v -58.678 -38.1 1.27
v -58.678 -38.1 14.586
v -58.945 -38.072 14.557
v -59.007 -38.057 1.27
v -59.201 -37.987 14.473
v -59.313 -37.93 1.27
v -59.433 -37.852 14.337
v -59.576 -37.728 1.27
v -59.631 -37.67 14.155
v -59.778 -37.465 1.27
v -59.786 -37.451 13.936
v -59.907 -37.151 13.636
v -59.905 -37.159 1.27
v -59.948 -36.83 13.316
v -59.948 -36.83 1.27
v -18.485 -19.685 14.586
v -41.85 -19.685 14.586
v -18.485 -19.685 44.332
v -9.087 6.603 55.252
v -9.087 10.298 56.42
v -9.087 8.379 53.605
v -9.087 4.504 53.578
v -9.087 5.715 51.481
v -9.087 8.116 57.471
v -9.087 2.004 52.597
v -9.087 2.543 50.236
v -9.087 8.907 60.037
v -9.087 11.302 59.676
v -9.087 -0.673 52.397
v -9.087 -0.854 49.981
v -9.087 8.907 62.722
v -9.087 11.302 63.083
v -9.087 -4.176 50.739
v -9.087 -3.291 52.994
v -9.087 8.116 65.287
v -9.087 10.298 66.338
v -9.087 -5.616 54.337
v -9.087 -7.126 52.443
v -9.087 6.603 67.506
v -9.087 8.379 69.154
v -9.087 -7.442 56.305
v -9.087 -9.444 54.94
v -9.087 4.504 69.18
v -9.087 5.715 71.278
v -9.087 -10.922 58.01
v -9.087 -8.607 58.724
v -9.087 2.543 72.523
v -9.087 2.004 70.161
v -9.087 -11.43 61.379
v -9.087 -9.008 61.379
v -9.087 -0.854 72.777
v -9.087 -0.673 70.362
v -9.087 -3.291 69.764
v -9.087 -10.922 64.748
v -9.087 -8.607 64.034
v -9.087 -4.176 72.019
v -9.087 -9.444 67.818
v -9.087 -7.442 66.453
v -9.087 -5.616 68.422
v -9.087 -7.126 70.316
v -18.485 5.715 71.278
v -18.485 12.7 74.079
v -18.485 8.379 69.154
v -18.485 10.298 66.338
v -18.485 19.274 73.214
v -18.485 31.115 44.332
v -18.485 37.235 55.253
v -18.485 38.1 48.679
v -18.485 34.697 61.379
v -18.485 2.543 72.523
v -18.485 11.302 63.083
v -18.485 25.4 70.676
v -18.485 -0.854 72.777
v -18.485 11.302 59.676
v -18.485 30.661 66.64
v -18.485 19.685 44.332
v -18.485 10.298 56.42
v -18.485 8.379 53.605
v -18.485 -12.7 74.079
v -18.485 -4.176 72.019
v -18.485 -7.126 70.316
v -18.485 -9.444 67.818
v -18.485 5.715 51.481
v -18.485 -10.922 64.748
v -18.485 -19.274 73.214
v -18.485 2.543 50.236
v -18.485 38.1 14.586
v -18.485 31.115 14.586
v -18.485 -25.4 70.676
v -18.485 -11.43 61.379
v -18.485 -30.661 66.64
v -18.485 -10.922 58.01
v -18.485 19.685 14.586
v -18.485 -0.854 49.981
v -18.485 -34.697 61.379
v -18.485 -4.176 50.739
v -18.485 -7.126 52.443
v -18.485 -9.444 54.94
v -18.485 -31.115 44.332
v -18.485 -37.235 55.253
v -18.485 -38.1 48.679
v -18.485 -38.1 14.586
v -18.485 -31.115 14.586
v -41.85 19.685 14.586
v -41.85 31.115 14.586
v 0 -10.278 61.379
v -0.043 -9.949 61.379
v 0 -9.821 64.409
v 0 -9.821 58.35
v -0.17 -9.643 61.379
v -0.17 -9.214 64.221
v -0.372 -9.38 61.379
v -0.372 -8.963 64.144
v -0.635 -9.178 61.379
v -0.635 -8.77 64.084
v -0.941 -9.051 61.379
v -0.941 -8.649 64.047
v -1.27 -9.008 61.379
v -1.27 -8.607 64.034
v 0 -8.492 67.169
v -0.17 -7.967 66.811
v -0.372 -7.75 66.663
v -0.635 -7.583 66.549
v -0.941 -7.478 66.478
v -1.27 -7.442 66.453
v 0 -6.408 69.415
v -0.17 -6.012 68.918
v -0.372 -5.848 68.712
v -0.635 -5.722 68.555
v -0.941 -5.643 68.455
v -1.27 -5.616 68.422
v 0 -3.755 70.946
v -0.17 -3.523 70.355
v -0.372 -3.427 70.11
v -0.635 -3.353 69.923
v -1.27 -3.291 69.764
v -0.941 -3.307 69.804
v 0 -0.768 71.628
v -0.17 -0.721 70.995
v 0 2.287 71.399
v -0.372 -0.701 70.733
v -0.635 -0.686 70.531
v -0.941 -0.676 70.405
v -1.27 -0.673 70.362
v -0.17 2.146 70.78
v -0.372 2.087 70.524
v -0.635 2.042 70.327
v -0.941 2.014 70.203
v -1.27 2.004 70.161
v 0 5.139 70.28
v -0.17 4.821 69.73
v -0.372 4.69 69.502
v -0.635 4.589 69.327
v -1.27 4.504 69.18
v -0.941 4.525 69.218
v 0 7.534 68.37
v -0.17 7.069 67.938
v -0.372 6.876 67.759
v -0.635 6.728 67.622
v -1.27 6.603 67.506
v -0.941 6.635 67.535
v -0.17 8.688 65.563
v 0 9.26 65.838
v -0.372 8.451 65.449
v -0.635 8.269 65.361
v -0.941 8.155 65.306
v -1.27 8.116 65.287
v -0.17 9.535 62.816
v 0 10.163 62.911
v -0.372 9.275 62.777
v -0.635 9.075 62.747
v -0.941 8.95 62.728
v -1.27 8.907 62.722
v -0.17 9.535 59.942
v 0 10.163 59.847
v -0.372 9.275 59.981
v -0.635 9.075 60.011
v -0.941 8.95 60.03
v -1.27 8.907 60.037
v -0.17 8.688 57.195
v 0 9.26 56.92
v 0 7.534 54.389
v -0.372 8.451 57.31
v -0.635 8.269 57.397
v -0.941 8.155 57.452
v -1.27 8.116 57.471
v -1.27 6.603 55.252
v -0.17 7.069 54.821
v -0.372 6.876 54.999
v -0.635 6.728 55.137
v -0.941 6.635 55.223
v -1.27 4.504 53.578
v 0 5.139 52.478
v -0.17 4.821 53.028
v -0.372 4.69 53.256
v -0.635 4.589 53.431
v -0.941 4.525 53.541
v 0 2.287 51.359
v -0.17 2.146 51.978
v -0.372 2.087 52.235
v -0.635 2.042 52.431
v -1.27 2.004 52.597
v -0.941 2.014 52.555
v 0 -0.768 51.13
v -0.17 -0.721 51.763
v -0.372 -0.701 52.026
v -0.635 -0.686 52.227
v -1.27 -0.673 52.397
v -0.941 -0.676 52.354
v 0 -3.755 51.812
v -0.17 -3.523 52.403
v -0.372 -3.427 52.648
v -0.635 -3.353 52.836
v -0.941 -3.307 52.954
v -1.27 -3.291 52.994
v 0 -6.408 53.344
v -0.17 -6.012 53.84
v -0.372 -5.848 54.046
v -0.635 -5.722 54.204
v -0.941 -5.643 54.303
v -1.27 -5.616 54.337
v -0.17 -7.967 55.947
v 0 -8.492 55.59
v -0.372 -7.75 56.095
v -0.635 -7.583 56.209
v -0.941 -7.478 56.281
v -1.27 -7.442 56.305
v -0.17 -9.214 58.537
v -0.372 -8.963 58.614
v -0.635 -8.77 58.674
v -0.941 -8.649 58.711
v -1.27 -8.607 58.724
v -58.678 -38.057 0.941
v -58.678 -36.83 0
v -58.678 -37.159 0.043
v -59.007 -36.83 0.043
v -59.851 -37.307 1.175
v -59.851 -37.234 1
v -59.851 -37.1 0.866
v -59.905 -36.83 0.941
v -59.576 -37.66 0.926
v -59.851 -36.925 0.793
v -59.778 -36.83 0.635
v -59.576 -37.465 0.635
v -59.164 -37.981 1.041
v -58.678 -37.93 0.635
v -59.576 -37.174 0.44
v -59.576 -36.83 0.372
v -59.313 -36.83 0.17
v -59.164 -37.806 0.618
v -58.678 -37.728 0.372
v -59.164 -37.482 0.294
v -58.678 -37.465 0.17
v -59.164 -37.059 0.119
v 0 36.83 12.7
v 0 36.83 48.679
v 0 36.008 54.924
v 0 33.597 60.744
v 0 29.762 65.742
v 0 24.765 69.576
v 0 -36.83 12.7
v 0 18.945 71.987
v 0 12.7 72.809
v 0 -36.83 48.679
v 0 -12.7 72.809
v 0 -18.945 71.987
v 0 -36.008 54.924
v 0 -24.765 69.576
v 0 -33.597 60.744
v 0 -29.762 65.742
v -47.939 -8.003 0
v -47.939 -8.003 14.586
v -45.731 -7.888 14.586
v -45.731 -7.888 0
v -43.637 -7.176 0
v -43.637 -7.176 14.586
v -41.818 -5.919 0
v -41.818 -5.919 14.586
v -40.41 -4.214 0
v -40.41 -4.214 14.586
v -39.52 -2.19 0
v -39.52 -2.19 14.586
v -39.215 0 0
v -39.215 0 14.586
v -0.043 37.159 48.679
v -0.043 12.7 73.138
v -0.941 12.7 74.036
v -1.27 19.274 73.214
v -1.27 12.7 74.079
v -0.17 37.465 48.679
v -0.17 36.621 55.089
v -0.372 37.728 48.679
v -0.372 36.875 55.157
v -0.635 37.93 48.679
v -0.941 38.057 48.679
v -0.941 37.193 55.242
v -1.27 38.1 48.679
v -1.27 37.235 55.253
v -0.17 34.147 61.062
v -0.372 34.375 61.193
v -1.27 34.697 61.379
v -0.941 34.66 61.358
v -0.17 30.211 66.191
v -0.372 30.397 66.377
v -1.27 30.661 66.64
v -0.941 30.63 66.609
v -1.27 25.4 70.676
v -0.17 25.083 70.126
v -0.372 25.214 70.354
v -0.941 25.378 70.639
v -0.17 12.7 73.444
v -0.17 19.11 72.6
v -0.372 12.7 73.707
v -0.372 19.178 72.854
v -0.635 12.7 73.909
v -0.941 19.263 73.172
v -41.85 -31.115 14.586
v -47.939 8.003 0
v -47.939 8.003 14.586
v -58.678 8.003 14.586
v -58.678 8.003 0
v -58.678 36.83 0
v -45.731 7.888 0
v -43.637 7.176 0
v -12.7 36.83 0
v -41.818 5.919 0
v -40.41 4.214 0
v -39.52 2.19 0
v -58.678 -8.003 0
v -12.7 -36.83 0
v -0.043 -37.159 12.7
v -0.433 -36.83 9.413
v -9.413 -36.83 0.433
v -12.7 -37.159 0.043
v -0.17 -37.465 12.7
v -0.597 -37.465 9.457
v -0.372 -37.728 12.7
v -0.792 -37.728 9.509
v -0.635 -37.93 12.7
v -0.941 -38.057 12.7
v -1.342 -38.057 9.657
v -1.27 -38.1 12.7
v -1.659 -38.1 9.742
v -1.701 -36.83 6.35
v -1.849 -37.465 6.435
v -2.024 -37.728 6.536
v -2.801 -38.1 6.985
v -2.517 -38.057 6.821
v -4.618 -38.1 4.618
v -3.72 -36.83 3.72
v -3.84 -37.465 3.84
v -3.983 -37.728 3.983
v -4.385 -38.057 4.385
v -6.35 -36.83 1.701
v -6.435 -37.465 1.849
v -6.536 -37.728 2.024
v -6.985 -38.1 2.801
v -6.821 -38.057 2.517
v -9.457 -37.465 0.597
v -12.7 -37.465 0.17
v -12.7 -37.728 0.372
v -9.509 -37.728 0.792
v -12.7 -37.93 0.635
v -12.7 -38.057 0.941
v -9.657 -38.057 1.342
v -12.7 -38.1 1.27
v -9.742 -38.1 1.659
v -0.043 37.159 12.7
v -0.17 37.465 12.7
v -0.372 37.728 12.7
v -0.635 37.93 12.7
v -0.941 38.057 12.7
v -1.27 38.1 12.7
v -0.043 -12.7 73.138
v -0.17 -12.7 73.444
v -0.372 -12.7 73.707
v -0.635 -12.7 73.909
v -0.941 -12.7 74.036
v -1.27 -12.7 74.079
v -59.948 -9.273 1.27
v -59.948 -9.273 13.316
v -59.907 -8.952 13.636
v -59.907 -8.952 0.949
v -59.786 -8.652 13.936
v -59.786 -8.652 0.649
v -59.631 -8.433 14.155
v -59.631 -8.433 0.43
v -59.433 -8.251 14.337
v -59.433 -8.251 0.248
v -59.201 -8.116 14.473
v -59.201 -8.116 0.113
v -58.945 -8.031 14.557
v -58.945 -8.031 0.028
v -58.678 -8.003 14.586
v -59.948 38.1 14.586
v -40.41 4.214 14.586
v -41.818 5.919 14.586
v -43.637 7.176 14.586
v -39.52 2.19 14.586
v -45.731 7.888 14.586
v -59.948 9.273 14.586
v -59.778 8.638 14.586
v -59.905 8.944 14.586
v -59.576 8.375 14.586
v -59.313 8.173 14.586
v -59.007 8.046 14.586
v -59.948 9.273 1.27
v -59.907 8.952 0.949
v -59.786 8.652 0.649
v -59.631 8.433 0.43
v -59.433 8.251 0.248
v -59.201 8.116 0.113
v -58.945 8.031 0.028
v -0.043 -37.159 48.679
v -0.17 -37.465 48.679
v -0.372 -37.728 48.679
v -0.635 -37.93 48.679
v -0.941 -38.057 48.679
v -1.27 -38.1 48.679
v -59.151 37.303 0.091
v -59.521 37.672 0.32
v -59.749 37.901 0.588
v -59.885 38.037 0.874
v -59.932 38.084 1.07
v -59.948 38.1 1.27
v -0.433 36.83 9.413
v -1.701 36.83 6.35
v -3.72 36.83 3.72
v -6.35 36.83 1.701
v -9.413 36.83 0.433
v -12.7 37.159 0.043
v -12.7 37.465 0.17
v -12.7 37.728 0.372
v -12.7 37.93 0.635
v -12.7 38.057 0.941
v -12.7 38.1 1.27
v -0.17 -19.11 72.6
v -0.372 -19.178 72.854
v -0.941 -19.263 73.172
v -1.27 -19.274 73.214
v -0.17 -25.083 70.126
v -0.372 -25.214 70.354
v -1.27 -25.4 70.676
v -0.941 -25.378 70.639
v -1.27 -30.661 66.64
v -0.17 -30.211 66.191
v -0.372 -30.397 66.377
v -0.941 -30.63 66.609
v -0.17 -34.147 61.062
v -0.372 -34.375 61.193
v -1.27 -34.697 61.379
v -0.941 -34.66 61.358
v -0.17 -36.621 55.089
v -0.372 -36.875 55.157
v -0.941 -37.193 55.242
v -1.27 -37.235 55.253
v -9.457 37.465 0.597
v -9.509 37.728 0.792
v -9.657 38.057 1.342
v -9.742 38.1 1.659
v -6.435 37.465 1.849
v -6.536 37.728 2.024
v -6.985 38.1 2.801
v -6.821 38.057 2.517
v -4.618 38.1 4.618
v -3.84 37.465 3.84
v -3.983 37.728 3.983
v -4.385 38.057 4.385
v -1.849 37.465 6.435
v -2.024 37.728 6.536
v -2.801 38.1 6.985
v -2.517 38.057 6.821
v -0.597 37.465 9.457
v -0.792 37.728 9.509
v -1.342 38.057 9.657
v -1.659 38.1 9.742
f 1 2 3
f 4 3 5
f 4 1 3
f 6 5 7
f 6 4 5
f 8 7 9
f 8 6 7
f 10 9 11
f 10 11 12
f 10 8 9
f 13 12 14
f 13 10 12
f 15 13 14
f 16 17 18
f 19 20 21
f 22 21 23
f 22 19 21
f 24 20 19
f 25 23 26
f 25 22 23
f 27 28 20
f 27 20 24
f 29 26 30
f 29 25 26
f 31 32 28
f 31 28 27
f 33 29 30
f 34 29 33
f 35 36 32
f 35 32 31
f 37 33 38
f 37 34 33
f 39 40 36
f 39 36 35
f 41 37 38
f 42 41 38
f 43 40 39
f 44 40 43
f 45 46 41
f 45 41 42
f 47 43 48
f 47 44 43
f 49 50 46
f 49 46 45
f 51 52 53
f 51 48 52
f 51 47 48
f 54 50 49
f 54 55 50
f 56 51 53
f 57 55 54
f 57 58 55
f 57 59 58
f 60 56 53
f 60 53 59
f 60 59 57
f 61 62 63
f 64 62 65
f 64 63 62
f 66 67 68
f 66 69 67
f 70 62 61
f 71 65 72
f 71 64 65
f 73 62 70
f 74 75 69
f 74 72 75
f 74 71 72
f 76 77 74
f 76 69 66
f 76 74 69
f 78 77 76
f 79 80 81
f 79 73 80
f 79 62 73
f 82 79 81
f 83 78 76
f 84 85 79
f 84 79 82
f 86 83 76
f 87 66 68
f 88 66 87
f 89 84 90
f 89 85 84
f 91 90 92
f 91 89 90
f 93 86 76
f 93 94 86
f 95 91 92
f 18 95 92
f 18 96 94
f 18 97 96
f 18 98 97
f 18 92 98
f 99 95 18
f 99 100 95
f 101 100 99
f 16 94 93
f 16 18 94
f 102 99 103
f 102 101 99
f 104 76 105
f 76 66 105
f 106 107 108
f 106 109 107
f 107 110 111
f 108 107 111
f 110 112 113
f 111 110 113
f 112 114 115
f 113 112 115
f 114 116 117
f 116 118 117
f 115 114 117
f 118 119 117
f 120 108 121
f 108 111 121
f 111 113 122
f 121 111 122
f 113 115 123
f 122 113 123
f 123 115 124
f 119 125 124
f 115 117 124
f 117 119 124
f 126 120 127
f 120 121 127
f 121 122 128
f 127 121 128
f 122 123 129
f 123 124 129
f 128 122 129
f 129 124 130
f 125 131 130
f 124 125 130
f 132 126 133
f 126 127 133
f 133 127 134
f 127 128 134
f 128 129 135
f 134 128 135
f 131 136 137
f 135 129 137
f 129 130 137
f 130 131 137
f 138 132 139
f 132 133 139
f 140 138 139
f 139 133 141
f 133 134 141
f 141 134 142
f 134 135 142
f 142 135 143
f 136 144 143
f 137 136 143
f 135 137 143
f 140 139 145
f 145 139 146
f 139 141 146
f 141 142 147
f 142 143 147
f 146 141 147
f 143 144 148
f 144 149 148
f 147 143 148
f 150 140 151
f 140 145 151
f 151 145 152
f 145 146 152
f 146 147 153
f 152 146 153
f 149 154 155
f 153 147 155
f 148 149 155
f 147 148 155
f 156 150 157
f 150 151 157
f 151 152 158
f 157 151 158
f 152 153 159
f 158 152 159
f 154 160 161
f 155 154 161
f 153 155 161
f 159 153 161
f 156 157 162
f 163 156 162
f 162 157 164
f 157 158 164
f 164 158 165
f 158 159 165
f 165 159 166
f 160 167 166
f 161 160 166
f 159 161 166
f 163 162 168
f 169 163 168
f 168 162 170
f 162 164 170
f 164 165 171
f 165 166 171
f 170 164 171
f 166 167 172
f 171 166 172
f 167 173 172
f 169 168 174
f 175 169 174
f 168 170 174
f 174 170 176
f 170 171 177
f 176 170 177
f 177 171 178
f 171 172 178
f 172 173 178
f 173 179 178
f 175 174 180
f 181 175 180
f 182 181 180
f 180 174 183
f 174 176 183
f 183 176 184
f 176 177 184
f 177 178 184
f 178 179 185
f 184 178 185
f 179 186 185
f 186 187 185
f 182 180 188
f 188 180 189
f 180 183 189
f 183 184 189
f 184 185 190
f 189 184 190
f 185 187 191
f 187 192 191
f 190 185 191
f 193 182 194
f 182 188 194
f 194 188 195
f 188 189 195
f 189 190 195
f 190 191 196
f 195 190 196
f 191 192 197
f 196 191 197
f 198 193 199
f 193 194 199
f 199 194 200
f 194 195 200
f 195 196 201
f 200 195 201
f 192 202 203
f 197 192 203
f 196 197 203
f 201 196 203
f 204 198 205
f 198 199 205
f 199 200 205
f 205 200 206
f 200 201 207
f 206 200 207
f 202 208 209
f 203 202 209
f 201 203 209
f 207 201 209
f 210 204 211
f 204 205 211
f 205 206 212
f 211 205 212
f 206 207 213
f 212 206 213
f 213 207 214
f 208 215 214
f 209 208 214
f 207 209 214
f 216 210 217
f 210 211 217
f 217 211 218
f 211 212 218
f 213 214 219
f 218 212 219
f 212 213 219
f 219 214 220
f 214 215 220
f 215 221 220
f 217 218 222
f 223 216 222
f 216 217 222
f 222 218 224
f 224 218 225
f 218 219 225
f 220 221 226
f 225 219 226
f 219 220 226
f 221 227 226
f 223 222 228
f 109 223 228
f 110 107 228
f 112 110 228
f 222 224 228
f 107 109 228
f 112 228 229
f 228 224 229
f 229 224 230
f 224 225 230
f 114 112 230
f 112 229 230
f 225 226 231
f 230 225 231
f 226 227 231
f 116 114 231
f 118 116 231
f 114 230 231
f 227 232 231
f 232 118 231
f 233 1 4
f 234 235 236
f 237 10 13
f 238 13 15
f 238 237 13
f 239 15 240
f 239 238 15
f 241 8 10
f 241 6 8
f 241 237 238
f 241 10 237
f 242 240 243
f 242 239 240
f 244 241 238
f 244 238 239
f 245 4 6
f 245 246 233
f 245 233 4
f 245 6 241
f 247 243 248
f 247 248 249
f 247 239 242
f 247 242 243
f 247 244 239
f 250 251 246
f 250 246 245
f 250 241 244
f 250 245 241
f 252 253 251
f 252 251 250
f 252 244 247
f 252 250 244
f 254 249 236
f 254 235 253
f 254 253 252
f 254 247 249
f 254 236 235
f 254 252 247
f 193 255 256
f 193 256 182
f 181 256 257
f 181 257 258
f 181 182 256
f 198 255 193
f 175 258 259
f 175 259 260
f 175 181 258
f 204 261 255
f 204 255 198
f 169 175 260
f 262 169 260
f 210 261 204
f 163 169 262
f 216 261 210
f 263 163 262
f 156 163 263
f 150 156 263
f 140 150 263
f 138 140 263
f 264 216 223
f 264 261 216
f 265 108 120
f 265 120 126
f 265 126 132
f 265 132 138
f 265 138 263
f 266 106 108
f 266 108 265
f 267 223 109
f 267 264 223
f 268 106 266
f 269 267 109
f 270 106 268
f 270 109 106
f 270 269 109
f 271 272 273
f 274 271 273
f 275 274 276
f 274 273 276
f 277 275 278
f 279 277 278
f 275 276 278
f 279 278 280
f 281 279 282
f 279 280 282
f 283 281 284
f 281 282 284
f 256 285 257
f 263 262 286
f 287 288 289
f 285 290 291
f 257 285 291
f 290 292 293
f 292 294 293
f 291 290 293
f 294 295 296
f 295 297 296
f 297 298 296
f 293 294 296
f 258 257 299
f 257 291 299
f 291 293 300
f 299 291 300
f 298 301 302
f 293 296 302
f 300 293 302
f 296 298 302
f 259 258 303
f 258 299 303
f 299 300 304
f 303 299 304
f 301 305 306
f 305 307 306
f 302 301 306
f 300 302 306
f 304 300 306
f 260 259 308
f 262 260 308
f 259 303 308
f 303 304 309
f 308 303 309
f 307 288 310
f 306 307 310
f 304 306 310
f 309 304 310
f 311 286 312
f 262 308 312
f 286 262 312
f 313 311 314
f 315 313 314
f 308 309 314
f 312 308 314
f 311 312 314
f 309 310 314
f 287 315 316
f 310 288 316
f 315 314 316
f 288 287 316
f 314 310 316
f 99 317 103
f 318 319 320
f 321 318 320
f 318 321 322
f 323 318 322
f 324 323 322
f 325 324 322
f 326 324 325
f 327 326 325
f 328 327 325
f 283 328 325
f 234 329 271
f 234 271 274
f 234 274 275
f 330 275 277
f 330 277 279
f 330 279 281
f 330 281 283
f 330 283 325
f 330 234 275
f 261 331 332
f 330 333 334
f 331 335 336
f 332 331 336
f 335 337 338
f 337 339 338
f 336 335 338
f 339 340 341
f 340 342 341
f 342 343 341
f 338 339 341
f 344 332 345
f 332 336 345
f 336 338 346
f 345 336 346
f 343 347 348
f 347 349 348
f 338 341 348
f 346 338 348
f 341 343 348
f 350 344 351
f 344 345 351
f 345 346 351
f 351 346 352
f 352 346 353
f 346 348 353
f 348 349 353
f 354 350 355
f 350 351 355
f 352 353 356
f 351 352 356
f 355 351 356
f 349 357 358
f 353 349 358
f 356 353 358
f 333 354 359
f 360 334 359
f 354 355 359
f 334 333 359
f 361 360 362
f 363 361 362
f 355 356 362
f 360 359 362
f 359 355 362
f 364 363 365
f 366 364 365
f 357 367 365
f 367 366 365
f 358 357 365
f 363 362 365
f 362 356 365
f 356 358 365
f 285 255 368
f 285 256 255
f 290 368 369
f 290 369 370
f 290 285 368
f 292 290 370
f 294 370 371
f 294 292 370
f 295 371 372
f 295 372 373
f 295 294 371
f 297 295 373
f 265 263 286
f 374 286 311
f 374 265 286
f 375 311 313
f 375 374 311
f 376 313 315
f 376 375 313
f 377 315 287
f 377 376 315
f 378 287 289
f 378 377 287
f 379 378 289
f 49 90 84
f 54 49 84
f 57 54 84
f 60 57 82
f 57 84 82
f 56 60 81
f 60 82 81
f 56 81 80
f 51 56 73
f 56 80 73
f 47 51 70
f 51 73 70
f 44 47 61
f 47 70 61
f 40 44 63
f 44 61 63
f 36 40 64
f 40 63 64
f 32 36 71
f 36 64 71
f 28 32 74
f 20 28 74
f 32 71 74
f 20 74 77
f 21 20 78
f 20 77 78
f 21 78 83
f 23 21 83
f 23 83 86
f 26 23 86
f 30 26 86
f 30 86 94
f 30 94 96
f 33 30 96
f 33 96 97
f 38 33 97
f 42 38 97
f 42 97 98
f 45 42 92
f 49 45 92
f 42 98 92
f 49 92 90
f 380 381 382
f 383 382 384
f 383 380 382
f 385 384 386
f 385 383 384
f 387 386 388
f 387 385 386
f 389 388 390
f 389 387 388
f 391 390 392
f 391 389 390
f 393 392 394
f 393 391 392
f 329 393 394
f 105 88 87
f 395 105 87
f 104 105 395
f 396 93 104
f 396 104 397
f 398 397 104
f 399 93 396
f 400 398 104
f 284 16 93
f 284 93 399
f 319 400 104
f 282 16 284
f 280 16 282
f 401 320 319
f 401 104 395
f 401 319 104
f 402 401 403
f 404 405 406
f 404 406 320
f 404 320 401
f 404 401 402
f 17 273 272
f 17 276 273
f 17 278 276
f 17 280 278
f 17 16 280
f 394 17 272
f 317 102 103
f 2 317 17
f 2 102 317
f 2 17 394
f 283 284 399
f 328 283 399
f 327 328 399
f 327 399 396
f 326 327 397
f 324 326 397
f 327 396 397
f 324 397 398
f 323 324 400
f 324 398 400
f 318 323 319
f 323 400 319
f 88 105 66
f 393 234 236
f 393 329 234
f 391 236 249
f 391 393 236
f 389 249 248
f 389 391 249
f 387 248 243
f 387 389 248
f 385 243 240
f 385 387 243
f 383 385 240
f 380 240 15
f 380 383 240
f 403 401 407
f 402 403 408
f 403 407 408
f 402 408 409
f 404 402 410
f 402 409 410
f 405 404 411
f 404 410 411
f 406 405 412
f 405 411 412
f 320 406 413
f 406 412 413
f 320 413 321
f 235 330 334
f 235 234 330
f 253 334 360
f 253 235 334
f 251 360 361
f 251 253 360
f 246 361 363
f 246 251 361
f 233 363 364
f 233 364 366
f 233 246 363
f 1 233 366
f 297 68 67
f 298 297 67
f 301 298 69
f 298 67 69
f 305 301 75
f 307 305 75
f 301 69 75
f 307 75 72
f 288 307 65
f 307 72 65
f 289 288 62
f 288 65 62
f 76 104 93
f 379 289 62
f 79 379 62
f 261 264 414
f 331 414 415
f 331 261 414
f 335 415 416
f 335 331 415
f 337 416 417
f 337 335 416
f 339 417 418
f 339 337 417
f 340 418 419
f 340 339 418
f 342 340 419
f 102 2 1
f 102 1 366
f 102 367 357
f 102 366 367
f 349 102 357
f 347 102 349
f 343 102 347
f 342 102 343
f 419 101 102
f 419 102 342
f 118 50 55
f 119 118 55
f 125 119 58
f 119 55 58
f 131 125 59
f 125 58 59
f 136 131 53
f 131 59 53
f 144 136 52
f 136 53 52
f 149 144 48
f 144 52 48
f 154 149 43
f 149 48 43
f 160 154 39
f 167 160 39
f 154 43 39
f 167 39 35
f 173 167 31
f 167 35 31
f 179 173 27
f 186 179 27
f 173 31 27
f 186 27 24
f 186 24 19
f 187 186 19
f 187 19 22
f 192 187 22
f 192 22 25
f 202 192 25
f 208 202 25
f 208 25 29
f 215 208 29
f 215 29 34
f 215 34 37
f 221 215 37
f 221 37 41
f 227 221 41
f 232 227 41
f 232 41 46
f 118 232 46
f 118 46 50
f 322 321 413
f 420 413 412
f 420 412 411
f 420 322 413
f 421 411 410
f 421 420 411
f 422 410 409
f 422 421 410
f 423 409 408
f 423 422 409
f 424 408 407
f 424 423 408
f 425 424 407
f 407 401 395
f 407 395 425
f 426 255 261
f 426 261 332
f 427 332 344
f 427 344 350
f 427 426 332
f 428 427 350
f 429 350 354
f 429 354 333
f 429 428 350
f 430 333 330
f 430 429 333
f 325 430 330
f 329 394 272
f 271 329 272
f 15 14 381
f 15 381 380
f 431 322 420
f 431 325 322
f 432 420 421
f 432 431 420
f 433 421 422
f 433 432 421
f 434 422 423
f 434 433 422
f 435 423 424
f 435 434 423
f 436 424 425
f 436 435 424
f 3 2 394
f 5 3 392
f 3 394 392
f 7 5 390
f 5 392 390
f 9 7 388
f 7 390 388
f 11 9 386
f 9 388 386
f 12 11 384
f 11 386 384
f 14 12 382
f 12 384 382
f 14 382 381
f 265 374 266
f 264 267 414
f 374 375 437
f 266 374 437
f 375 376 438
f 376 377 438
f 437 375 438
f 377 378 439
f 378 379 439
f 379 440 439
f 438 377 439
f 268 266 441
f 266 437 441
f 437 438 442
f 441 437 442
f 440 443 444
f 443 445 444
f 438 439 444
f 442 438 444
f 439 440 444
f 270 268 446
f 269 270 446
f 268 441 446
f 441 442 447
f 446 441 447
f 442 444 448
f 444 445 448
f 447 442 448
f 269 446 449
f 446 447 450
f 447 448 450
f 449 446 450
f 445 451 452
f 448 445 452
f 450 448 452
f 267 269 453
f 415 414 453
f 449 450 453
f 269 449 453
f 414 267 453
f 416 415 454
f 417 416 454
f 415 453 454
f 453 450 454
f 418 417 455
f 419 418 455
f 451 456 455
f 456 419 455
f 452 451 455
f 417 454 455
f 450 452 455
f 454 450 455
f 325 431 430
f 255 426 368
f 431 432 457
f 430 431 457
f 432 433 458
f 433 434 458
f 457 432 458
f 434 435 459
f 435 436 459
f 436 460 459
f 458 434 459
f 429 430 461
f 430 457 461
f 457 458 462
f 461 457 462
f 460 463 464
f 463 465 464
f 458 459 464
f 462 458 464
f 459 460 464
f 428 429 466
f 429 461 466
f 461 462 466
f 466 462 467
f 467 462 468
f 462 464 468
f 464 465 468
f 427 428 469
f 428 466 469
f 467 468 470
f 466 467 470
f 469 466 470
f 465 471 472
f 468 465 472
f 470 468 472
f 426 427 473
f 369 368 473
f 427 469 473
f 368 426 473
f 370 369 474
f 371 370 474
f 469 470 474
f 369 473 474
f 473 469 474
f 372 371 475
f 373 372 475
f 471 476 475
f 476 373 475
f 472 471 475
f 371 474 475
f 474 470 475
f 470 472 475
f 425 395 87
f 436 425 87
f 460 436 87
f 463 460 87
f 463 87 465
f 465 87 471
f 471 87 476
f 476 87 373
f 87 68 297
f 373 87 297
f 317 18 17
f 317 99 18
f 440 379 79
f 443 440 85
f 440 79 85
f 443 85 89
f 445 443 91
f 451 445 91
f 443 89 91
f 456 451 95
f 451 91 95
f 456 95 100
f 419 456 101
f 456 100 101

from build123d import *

# Parameters (mm, degrees)
F1_DEPTH  = 38.1
F2_R      = 9.0076691871
F3_DEPTH  = 18.4852466609
F4_R      = 11.43
F4_R_2    = 9.0076691871
F6_DEPTH  = 9.398
F7_DEPTH  = 25.4
F10_DEPTH = 5.715
F12_R     = 25.4
F13_R     = 12.7
F14_R     = 1.27


# Not quite as in the source:
# - a pattern or mirror of a feature is missing from the dataset's text; its kind, count and spacing are read off the source's solid


with BuildPart() as f1:
    # F0 (on Front) → F1 (new body, symmetric)
    with BuildSketch(Plane.XZ):
        Polygon((0, 0), (0, 74.0791857243), (-18.4852466609, 74.0791857243), (-18.4852466609, 14.5855043083), (-59.9480941892, 14.5855043083), (-59.9480941892, 0), align=None)
    extrude(amount=F1_DEPTH, both=True)

    # F2 (on face) → F3 (cut, through all)
    with BuildSketch(Plane(origin=(-18.4852466609, 0, 0), x_dir=(0, -1, 0), z_dir=(-1, 0, 0))):
        with Locations((0, 61.3791857243)):
            Circle(F2_R)
    extrude(amount=-F3_DEPTH, mode=Mode.SUBTRACT)

    # F4 (on face) → F6 (cut)
    with BuildSketch(Plane(origin=(-18.4852466609, 0, 0), x_dir=(0, -1, 0), z_dir=(-1, 0, 0))):
        with Locations((0, 61.3791857243)):
            Circle(F4_R)
        with Locations((0, 61.3791857243)):
            Circle(F4_R_2, mode=Mode.SUBTRACT)
    extrude(amount=-F6_DEPTH, mode=Mode.SUBTRACT)

    # F5 (on face) → F7 (cut)
    with BuildSketch(Plane.XY.offset(14.5855043083)):
        with BuildLine():
            ThreePointArc((-47.9387399794, -8.003022201), (-55.2808618291, 0), (-47.9387399794, 8.003022201))
            Line((-47.9387399794, 8.003022201), (-59.9480941892, 8.003022201))
            Line((-59.9480941892, 8.003022201), (-59.9480941892, -8.003022201))
            Line((-59.9480941892, -8.003022201), (-47.9387399794, -8.003022201))
        make_face()
        with BuildLine():
            ThreePointArc((-47.9387399794, -8.003022201), (-41.8177369816, -5.9191702591), (-39.2153265492, 0))
            ThreePointArc((-39.2153265492, 0), (-41.8177369816, 5.9191702591), (-47.9387399794, 8.003022201))
            ThreePointArc((-47.9387399794, 8.003022201), (-55.2808618291, 0), (-47.9387399794, -8.003022201))
        make_face()
    extrude(amount=-F7_DEPTH, mode=Mode.SUBTRACT)

    # F9 (on offset) → F10 (join, symmetric)
    with BuildSketch(Plane.XZ.offset(25.4)):
        Polygon((-41.8496876955, 14.5855043083), (-18.4852466609, 14.5855043083), (-18.4852466609, 44.3323450163), align=None)
    f10 = extrude(amount=F10_DEPTH, both=True)

    # F10_copies: F10 across plane
    add(f10.mirror(Plane.ZX))

    # F12
    f12_edges = [f1.edges().sort_by_distance(p)[0] for p in [
        (-9.242623, 38.1, 74.079186),
        (-9.242623, -38.1, 74.079186),
    ]]
    fillet(f12_edges, radius=F12_R)

    # F13
    f13_edges = [f1.edges().sort_by_distance(p)[0] for p in [
        (0, 0, 0),
    ]]
    fillet(f13_edges, radius=F13_R)

    # F14
    f14_edges = [f1.edges().sort_by_distance(p)[0] for p in [
        (0, 38.1, 30.689593),
        (0, 0, 12.7),
        (0, 30.660512, 66.639698),
        (0, -38.1, 30.689593),
        (0, 0, 74.079186),
        (0, -30.660512, 66.639698),
        (0, 9.007669, 61.379186),
        (-59.948094, 23.051511, 0),
        (-3.719744, 38.1, 3.719744),
        (-36.324047, 38.1, 0),
        (-3.719744, -38.1, 3.719744),
        (-36.324047, -38.1, 0),
        (-59.948094, -38.1, 7.292752),
        (-59.948094, -23.051511, 0),
        (-59.948094, 8.003022, 7.292752),
        (-59.948094, -23.051511, 14.585504),
        (-59.948094, -8.003022, 7.292752),
    ]]
    fillet(f14_edges, radius=F14_R)


solid = f1.part
